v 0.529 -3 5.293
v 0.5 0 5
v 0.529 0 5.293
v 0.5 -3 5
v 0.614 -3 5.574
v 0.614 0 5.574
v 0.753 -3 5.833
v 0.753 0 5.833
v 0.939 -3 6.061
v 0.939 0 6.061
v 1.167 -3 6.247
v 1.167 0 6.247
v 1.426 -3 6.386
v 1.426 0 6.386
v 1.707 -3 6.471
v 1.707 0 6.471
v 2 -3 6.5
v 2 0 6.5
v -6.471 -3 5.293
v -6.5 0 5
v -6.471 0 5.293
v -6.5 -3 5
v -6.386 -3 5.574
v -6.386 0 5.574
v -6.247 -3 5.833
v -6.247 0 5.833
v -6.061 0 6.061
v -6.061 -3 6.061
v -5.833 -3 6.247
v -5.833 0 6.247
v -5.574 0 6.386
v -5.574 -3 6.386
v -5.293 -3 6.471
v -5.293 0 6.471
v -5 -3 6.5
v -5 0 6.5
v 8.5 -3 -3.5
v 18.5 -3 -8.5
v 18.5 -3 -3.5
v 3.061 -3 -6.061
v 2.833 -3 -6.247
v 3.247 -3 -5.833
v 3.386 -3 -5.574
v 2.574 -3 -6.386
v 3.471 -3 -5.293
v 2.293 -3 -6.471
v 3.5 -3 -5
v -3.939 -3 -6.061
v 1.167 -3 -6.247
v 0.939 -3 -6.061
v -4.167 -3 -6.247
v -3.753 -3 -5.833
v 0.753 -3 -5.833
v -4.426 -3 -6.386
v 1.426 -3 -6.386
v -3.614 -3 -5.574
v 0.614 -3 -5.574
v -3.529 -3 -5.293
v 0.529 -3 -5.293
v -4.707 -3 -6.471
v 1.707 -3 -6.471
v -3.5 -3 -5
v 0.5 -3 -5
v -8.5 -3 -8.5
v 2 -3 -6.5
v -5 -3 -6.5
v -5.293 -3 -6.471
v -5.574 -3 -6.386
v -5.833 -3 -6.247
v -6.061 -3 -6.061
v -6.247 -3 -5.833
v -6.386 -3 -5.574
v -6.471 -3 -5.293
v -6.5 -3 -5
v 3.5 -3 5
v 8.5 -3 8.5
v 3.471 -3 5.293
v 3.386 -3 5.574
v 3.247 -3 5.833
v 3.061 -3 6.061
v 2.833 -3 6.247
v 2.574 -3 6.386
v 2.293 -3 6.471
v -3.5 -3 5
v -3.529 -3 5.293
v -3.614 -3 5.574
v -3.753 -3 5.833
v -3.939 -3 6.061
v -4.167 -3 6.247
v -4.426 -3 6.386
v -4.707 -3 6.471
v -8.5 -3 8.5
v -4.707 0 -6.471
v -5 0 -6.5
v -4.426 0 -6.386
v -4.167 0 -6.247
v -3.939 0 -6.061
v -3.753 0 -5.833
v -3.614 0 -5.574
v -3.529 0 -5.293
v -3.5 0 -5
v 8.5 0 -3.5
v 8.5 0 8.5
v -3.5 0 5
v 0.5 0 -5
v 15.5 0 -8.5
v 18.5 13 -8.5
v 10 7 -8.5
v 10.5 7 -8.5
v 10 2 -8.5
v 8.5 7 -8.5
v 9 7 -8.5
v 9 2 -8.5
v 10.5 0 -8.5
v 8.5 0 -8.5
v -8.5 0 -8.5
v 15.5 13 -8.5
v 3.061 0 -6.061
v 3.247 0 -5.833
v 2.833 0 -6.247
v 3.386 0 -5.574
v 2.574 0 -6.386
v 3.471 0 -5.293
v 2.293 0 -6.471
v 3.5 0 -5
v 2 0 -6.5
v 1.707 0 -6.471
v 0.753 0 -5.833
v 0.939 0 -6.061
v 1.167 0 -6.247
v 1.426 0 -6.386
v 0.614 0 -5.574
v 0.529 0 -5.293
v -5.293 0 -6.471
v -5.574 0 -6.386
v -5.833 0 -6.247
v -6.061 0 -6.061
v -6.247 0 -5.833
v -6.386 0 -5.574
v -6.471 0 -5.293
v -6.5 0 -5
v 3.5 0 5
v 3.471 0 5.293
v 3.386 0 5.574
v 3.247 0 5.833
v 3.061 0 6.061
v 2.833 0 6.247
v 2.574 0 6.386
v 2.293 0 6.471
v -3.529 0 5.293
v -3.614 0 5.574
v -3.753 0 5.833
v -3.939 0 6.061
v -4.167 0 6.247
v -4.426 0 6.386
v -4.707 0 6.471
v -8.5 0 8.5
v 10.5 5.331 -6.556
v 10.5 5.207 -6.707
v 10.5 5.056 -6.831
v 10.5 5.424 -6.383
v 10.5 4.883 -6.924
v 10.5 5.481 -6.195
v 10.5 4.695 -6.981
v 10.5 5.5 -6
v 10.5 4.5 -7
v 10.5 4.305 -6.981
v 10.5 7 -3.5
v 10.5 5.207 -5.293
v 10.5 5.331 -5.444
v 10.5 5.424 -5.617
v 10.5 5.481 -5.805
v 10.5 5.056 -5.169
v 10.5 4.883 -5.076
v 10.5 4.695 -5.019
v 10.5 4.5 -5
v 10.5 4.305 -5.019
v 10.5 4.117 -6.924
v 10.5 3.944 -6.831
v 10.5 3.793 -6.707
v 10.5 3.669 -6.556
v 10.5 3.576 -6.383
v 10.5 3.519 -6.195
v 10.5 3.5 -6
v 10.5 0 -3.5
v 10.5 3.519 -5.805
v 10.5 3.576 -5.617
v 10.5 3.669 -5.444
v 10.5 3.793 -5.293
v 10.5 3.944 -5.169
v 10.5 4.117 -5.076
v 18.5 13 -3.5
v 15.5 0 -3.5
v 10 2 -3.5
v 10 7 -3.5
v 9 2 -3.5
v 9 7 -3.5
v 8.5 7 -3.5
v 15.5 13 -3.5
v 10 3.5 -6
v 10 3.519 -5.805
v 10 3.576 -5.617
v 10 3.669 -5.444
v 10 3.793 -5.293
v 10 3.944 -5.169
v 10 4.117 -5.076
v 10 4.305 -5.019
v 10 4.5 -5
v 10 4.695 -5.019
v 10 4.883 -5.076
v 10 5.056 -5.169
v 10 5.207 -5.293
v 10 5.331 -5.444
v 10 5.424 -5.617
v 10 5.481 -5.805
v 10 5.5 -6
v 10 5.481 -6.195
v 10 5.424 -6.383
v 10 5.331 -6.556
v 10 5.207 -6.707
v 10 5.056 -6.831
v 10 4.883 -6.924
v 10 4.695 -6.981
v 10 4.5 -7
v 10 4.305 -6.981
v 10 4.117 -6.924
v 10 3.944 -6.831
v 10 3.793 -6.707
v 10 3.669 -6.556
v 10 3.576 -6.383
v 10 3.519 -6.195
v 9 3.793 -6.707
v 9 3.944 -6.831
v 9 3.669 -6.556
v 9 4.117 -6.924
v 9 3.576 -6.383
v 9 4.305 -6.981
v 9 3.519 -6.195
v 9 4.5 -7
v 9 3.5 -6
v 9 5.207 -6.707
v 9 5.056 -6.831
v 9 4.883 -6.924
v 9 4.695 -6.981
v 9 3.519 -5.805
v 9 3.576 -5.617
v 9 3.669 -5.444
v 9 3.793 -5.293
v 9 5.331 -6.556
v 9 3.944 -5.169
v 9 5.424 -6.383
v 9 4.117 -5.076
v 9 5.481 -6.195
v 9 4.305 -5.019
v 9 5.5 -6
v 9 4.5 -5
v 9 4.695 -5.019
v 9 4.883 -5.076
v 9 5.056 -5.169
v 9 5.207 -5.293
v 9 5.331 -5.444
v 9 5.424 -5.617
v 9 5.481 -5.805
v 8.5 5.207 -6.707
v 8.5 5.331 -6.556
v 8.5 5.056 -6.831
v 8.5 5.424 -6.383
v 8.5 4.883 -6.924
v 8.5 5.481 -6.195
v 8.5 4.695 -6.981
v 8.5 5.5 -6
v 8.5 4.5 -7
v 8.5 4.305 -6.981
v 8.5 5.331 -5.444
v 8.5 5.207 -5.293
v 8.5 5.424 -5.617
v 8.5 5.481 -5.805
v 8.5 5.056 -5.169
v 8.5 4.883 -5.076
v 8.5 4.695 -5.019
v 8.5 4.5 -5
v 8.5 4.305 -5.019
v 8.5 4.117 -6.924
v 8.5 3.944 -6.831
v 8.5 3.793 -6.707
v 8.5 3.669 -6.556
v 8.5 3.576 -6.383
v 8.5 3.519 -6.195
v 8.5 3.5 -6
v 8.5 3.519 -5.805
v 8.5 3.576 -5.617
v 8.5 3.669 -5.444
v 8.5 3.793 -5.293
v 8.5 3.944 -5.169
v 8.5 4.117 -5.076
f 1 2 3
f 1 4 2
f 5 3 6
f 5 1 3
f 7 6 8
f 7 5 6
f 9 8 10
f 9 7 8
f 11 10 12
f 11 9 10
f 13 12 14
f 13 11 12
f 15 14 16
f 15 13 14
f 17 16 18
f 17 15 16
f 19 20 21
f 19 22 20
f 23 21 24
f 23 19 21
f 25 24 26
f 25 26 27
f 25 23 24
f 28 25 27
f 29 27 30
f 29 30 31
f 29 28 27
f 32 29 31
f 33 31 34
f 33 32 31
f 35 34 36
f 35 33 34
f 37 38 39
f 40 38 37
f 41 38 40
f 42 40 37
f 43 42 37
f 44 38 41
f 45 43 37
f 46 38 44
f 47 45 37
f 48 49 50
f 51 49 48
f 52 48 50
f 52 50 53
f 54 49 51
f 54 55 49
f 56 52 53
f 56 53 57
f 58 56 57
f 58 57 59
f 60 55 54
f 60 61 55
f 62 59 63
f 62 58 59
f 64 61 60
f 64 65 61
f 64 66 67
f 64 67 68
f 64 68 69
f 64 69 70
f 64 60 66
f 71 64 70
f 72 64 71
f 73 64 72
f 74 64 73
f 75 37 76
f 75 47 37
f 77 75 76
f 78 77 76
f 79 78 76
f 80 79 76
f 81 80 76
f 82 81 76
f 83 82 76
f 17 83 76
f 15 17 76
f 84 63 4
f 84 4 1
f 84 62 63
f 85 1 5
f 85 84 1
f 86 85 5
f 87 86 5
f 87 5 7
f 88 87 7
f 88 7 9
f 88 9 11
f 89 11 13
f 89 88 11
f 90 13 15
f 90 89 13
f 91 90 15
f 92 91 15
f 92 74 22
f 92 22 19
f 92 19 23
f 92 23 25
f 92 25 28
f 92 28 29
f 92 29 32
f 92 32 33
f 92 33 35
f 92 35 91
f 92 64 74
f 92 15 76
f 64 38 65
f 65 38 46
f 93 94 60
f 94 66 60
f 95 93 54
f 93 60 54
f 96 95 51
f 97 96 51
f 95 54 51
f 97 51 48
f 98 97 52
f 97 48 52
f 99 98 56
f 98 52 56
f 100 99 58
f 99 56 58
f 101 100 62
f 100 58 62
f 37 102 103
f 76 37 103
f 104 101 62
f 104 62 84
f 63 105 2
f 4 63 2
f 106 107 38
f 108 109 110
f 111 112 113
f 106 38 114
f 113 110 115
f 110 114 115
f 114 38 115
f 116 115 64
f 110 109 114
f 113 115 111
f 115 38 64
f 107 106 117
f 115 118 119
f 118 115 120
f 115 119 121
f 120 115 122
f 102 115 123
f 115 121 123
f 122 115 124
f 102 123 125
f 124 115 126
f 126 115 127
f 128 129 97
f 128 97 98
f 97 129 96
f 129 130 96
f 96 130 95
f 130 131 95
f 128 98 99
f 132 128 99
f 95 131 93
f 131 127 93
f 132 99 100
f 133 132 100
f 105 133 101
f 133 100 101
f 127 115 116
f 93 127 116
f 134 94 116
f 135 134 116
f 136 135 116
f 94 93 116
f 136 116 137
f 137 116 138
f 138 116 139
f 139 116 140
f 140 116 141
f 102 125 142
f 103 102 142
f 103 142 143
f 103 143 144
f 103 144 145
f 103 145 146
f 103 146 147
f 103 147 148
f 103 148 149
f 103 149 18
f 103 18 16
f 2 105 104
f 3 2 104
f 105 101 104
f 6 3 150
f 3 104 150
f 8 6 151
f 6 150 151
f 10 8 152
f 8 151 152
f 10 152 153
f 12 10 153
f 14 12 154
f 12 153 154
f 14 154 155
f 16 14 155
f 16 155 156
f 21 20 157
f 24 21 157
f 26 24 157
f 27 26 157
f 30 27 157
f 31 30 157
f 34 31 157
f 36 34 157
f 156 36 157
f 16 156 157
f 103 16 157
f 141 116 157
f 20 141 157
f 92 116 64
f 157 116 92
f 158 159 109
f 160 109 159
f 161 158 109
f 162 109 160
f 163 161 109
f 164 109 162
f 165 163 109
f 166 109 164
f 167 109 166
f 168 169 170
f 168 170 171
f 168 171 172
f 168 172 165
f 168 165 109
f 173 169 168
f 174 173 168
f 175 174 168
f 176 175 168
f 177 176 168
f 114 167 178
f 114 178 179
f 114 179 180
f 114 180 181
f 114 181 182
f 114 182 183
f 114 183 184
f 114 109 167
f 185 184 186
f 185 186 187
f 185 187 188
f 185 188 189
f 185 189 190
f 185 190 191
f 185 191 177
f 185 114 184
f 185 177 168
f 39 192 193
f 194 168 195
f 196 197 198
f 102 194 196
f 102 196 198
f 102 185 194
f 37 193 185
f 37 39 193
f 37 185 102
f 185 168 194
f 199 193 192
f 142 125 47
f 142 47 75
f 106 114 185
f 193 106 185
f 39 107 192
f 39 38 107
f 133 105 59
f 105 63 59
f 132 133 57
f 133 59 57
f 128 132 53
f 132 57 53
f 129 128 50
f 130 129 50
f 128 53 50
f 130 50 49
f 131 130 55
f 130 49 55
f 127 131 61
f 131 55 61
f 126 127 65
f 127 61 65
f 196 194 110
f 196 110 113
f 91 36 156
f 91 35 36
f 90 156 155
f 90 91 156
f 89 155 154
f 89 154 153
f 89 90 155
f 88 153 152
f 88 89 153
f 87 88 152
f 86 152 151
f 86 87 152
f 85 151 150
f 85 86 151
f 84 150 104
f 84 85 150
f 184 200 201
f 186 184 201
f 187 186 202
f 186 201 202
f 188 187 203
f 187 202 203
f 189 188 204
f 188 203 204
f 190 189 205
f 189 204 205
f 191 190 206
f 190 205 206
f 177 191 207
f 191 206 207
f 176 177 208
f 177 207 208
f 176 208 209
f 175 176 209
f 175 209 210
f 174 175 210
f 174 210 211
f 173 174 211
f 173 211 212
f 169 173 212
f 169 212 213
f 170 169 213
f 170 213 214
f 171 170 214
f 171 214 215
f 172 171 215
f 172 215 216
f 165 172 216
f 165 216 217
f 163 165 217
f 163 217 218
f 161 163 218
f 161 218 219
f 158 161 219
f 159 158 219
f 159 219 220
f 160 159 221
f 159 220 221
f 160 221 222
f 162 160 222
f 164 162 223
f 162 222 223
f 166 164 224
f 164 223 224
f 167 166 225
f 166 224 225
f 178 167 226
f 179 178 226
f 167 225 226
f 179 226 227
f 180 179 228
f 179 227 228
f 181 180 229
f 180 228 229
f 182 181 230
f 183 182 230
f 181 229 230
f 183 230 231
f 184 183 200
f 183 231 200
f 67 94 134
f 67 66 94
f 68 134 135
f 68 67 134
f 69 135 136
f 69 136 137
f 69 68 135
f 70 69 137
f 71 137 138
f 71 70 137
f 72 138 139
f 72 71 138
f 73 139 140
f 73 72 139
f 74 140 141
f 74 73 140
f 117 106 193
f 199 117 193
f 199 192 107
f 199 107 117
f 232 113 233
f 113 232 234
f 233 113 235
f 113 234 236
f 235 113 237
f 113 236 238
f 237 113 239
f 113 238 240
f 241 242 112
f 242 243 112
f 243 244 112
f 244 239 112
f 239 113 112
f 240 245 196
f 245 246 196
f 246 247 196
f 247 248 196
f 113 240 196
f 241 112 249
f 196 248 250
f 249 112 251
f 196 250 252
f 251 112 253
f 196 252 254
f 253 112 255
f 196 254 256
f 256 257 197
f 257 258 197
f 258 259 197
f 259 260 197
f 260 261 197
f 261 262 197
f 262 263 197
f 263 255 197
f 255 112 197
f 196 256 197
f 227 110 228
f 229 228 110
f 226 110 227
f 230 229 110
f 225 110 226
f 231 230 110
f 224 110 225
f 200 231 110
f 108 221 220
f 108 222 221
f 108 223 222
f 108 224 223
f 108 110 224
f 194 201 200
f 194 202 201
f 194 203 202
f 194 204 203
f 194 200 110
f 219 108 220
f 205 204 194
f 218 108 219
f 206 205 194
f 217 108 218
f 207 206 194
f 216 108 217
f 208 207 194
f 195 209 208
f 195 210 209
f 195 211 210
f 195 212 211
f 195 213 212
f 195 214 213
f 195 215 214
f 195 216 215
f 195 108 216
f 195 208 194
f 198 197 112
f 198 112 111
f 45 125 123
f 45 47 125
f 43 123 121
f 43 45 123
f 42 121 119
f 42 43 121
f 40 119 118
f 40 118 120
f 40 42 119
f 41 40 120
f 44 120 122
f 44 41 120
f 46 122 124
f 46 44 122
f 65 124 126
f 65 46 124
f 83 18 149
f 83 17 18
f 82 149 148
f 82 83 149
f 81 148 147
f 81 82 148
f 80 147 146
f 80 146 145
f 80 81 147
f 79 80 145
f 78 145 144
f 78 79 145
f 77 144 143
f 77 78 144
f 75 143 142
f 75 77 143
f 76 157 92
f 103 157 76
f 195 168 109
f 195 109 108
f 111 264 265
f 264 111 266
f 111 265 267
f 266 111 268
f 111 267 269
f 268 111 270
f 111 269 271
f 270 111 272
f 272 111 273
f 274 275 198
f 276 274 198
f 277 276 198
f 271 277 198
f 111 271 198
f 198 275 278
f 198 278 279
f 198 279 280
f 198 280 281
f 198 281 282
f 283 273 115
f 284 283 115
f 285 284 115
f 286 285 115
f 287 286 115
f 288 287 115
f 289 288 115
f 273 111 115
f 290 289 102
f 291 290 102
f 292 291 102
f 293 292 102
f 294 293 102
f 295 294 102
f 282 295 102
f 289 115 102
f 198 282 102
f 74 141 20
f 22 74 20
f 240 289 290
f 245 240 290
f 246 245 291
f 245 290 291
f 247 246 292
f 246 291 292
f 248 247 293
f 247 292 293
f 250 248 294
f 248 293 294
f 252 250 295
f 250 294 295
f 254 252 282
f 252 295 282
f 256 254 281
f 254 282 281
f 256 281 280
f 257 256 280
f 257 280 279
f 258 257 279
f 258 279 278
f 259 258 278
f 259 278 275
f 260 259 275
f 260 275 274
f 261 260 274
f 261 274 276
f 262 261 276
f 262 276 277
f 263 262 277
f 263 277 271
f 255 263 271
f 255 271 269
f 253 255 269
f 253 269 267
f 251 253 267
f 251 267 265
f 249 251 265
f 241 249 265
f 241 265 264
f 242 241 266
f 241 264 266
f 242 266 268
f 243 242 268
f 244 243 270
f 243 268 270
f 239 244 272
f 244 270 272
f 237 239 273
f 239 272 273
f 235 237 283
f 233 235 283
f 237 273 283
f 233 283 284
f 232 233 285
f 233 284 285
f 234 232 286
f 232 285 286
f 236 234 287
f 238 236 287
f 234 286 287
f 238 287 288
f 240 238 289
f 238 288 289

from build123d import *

# Parameters (mm, degrees)
F0_W      = 17
F0_H      = 17
F0_W_2    = 3
F0_H_2    = 13
F1_DEPTH  = 3
F2_W      = 3
F2_H      = 5
F3_DEPTH  = 10
F4_W      = 3
F4_H      = 5
F5_DEPTH  = 13
F6_W      = 2
F6_H      = 5
F7_DEPTH  = 7
F8_W      = 1
F8_H      = 5
F9_DEPTH  = 5
F10_R     = 1
F11_DEPTH = 3
F12_R     = 1.49999


# Not quite as in the source:
# - a fillet or chamfer is up to 0.001 mm smaller than in the source, because OpenCascade refuses the exact size


with BuildPart() as f1:
    # F0 (on Front) → F1 (new body)
    with BuildSketch(Plane.XZ):
        Rectangle(F0_W, F0_H)
        with Locations((-5, 0)):
            Rectangle(F0_W_2, F0_H_2, mode=Mode.SUBTRACT)
        with Locations((2, 0)):
            Rectangle(F0_W_2, F0_H_2, mode=Mode.SUBTRACT)
    extrude(amount=F1_DEPTH)

    # F2 (on face) → F3 (join)
    with BuildSketch(Plane.YZ.offset(8.5)):
        with Locations((-1.5, -6)):
            Rectangle(F2_W, F2_H)
    extrude(amount=F3_DEPTH)

    # F4 (on face) → F5 (join)
    with BuildSketch(Plane(origin=(0, 0, 0), x_dir=(-1, 0, 0), z_dir=(0, 1, 0))):
        with Locations((-17, -6)):
            Rectangle(F4_W, F4_H)
    extrude(amount=F5_DEPTH)

    # F6 (on face) → F7 (join)
    with BuildSketch(Plane(origin=(0, 0, 0), x_dir=(-1, 0, 0), z_dir=(0, 1, 0))):
        with Locations((-9.5, -6)):
            Rectangle(F6_W, F6_H)
    extrude(amount=F7_DEPTH)

    # F8 (on face) → F9 (cut)
    with BuildSketch(Plane(origin=(0, 7, 0), x_dir=(-1, 0, 0), z_dir=(0, 1, 0))):
        with Locations((-9.5, -6)):
            Rectangle(F8_W, F8_H)
    extrude(amount=-F9_DEPTH, mode=Mode.SUBTRACT)

    # F10 (on face) → F11 (cut)
    with BuildSketch(Plane(origin=(8.5, 0, 0), x_dir=(0, -1, 0), z_dir=(-1, 0, 0))):
        with Locations((-4.5, -6)):
            Circle(F10_R)
    extrude(amount=-F11_DEPTH, mode=Mode.SUBTRACT)

    # F12 (radius 1.5 in the source; OpenCascade refuses exactly that, so slightly less here)
    f12_edges = [f1.edges().sort_by_distance(p)[0] for p in [
        (-6.5, -1.5, 6.5),
        (0.5, -1.5, 6.5),
        (3.5, -1.5, 6.5),
        (-3.5, -1.5, 6.5),
        (-3.5, -1.5, -6.5),
        (3.5, -1.5, -6.5),
        (0.5, -1.5, -6.5),
        (-6.5, -1.5, -6.5),
    ]]
    fillet(f12_edges, radius=F12_R)


solid = f1.part
